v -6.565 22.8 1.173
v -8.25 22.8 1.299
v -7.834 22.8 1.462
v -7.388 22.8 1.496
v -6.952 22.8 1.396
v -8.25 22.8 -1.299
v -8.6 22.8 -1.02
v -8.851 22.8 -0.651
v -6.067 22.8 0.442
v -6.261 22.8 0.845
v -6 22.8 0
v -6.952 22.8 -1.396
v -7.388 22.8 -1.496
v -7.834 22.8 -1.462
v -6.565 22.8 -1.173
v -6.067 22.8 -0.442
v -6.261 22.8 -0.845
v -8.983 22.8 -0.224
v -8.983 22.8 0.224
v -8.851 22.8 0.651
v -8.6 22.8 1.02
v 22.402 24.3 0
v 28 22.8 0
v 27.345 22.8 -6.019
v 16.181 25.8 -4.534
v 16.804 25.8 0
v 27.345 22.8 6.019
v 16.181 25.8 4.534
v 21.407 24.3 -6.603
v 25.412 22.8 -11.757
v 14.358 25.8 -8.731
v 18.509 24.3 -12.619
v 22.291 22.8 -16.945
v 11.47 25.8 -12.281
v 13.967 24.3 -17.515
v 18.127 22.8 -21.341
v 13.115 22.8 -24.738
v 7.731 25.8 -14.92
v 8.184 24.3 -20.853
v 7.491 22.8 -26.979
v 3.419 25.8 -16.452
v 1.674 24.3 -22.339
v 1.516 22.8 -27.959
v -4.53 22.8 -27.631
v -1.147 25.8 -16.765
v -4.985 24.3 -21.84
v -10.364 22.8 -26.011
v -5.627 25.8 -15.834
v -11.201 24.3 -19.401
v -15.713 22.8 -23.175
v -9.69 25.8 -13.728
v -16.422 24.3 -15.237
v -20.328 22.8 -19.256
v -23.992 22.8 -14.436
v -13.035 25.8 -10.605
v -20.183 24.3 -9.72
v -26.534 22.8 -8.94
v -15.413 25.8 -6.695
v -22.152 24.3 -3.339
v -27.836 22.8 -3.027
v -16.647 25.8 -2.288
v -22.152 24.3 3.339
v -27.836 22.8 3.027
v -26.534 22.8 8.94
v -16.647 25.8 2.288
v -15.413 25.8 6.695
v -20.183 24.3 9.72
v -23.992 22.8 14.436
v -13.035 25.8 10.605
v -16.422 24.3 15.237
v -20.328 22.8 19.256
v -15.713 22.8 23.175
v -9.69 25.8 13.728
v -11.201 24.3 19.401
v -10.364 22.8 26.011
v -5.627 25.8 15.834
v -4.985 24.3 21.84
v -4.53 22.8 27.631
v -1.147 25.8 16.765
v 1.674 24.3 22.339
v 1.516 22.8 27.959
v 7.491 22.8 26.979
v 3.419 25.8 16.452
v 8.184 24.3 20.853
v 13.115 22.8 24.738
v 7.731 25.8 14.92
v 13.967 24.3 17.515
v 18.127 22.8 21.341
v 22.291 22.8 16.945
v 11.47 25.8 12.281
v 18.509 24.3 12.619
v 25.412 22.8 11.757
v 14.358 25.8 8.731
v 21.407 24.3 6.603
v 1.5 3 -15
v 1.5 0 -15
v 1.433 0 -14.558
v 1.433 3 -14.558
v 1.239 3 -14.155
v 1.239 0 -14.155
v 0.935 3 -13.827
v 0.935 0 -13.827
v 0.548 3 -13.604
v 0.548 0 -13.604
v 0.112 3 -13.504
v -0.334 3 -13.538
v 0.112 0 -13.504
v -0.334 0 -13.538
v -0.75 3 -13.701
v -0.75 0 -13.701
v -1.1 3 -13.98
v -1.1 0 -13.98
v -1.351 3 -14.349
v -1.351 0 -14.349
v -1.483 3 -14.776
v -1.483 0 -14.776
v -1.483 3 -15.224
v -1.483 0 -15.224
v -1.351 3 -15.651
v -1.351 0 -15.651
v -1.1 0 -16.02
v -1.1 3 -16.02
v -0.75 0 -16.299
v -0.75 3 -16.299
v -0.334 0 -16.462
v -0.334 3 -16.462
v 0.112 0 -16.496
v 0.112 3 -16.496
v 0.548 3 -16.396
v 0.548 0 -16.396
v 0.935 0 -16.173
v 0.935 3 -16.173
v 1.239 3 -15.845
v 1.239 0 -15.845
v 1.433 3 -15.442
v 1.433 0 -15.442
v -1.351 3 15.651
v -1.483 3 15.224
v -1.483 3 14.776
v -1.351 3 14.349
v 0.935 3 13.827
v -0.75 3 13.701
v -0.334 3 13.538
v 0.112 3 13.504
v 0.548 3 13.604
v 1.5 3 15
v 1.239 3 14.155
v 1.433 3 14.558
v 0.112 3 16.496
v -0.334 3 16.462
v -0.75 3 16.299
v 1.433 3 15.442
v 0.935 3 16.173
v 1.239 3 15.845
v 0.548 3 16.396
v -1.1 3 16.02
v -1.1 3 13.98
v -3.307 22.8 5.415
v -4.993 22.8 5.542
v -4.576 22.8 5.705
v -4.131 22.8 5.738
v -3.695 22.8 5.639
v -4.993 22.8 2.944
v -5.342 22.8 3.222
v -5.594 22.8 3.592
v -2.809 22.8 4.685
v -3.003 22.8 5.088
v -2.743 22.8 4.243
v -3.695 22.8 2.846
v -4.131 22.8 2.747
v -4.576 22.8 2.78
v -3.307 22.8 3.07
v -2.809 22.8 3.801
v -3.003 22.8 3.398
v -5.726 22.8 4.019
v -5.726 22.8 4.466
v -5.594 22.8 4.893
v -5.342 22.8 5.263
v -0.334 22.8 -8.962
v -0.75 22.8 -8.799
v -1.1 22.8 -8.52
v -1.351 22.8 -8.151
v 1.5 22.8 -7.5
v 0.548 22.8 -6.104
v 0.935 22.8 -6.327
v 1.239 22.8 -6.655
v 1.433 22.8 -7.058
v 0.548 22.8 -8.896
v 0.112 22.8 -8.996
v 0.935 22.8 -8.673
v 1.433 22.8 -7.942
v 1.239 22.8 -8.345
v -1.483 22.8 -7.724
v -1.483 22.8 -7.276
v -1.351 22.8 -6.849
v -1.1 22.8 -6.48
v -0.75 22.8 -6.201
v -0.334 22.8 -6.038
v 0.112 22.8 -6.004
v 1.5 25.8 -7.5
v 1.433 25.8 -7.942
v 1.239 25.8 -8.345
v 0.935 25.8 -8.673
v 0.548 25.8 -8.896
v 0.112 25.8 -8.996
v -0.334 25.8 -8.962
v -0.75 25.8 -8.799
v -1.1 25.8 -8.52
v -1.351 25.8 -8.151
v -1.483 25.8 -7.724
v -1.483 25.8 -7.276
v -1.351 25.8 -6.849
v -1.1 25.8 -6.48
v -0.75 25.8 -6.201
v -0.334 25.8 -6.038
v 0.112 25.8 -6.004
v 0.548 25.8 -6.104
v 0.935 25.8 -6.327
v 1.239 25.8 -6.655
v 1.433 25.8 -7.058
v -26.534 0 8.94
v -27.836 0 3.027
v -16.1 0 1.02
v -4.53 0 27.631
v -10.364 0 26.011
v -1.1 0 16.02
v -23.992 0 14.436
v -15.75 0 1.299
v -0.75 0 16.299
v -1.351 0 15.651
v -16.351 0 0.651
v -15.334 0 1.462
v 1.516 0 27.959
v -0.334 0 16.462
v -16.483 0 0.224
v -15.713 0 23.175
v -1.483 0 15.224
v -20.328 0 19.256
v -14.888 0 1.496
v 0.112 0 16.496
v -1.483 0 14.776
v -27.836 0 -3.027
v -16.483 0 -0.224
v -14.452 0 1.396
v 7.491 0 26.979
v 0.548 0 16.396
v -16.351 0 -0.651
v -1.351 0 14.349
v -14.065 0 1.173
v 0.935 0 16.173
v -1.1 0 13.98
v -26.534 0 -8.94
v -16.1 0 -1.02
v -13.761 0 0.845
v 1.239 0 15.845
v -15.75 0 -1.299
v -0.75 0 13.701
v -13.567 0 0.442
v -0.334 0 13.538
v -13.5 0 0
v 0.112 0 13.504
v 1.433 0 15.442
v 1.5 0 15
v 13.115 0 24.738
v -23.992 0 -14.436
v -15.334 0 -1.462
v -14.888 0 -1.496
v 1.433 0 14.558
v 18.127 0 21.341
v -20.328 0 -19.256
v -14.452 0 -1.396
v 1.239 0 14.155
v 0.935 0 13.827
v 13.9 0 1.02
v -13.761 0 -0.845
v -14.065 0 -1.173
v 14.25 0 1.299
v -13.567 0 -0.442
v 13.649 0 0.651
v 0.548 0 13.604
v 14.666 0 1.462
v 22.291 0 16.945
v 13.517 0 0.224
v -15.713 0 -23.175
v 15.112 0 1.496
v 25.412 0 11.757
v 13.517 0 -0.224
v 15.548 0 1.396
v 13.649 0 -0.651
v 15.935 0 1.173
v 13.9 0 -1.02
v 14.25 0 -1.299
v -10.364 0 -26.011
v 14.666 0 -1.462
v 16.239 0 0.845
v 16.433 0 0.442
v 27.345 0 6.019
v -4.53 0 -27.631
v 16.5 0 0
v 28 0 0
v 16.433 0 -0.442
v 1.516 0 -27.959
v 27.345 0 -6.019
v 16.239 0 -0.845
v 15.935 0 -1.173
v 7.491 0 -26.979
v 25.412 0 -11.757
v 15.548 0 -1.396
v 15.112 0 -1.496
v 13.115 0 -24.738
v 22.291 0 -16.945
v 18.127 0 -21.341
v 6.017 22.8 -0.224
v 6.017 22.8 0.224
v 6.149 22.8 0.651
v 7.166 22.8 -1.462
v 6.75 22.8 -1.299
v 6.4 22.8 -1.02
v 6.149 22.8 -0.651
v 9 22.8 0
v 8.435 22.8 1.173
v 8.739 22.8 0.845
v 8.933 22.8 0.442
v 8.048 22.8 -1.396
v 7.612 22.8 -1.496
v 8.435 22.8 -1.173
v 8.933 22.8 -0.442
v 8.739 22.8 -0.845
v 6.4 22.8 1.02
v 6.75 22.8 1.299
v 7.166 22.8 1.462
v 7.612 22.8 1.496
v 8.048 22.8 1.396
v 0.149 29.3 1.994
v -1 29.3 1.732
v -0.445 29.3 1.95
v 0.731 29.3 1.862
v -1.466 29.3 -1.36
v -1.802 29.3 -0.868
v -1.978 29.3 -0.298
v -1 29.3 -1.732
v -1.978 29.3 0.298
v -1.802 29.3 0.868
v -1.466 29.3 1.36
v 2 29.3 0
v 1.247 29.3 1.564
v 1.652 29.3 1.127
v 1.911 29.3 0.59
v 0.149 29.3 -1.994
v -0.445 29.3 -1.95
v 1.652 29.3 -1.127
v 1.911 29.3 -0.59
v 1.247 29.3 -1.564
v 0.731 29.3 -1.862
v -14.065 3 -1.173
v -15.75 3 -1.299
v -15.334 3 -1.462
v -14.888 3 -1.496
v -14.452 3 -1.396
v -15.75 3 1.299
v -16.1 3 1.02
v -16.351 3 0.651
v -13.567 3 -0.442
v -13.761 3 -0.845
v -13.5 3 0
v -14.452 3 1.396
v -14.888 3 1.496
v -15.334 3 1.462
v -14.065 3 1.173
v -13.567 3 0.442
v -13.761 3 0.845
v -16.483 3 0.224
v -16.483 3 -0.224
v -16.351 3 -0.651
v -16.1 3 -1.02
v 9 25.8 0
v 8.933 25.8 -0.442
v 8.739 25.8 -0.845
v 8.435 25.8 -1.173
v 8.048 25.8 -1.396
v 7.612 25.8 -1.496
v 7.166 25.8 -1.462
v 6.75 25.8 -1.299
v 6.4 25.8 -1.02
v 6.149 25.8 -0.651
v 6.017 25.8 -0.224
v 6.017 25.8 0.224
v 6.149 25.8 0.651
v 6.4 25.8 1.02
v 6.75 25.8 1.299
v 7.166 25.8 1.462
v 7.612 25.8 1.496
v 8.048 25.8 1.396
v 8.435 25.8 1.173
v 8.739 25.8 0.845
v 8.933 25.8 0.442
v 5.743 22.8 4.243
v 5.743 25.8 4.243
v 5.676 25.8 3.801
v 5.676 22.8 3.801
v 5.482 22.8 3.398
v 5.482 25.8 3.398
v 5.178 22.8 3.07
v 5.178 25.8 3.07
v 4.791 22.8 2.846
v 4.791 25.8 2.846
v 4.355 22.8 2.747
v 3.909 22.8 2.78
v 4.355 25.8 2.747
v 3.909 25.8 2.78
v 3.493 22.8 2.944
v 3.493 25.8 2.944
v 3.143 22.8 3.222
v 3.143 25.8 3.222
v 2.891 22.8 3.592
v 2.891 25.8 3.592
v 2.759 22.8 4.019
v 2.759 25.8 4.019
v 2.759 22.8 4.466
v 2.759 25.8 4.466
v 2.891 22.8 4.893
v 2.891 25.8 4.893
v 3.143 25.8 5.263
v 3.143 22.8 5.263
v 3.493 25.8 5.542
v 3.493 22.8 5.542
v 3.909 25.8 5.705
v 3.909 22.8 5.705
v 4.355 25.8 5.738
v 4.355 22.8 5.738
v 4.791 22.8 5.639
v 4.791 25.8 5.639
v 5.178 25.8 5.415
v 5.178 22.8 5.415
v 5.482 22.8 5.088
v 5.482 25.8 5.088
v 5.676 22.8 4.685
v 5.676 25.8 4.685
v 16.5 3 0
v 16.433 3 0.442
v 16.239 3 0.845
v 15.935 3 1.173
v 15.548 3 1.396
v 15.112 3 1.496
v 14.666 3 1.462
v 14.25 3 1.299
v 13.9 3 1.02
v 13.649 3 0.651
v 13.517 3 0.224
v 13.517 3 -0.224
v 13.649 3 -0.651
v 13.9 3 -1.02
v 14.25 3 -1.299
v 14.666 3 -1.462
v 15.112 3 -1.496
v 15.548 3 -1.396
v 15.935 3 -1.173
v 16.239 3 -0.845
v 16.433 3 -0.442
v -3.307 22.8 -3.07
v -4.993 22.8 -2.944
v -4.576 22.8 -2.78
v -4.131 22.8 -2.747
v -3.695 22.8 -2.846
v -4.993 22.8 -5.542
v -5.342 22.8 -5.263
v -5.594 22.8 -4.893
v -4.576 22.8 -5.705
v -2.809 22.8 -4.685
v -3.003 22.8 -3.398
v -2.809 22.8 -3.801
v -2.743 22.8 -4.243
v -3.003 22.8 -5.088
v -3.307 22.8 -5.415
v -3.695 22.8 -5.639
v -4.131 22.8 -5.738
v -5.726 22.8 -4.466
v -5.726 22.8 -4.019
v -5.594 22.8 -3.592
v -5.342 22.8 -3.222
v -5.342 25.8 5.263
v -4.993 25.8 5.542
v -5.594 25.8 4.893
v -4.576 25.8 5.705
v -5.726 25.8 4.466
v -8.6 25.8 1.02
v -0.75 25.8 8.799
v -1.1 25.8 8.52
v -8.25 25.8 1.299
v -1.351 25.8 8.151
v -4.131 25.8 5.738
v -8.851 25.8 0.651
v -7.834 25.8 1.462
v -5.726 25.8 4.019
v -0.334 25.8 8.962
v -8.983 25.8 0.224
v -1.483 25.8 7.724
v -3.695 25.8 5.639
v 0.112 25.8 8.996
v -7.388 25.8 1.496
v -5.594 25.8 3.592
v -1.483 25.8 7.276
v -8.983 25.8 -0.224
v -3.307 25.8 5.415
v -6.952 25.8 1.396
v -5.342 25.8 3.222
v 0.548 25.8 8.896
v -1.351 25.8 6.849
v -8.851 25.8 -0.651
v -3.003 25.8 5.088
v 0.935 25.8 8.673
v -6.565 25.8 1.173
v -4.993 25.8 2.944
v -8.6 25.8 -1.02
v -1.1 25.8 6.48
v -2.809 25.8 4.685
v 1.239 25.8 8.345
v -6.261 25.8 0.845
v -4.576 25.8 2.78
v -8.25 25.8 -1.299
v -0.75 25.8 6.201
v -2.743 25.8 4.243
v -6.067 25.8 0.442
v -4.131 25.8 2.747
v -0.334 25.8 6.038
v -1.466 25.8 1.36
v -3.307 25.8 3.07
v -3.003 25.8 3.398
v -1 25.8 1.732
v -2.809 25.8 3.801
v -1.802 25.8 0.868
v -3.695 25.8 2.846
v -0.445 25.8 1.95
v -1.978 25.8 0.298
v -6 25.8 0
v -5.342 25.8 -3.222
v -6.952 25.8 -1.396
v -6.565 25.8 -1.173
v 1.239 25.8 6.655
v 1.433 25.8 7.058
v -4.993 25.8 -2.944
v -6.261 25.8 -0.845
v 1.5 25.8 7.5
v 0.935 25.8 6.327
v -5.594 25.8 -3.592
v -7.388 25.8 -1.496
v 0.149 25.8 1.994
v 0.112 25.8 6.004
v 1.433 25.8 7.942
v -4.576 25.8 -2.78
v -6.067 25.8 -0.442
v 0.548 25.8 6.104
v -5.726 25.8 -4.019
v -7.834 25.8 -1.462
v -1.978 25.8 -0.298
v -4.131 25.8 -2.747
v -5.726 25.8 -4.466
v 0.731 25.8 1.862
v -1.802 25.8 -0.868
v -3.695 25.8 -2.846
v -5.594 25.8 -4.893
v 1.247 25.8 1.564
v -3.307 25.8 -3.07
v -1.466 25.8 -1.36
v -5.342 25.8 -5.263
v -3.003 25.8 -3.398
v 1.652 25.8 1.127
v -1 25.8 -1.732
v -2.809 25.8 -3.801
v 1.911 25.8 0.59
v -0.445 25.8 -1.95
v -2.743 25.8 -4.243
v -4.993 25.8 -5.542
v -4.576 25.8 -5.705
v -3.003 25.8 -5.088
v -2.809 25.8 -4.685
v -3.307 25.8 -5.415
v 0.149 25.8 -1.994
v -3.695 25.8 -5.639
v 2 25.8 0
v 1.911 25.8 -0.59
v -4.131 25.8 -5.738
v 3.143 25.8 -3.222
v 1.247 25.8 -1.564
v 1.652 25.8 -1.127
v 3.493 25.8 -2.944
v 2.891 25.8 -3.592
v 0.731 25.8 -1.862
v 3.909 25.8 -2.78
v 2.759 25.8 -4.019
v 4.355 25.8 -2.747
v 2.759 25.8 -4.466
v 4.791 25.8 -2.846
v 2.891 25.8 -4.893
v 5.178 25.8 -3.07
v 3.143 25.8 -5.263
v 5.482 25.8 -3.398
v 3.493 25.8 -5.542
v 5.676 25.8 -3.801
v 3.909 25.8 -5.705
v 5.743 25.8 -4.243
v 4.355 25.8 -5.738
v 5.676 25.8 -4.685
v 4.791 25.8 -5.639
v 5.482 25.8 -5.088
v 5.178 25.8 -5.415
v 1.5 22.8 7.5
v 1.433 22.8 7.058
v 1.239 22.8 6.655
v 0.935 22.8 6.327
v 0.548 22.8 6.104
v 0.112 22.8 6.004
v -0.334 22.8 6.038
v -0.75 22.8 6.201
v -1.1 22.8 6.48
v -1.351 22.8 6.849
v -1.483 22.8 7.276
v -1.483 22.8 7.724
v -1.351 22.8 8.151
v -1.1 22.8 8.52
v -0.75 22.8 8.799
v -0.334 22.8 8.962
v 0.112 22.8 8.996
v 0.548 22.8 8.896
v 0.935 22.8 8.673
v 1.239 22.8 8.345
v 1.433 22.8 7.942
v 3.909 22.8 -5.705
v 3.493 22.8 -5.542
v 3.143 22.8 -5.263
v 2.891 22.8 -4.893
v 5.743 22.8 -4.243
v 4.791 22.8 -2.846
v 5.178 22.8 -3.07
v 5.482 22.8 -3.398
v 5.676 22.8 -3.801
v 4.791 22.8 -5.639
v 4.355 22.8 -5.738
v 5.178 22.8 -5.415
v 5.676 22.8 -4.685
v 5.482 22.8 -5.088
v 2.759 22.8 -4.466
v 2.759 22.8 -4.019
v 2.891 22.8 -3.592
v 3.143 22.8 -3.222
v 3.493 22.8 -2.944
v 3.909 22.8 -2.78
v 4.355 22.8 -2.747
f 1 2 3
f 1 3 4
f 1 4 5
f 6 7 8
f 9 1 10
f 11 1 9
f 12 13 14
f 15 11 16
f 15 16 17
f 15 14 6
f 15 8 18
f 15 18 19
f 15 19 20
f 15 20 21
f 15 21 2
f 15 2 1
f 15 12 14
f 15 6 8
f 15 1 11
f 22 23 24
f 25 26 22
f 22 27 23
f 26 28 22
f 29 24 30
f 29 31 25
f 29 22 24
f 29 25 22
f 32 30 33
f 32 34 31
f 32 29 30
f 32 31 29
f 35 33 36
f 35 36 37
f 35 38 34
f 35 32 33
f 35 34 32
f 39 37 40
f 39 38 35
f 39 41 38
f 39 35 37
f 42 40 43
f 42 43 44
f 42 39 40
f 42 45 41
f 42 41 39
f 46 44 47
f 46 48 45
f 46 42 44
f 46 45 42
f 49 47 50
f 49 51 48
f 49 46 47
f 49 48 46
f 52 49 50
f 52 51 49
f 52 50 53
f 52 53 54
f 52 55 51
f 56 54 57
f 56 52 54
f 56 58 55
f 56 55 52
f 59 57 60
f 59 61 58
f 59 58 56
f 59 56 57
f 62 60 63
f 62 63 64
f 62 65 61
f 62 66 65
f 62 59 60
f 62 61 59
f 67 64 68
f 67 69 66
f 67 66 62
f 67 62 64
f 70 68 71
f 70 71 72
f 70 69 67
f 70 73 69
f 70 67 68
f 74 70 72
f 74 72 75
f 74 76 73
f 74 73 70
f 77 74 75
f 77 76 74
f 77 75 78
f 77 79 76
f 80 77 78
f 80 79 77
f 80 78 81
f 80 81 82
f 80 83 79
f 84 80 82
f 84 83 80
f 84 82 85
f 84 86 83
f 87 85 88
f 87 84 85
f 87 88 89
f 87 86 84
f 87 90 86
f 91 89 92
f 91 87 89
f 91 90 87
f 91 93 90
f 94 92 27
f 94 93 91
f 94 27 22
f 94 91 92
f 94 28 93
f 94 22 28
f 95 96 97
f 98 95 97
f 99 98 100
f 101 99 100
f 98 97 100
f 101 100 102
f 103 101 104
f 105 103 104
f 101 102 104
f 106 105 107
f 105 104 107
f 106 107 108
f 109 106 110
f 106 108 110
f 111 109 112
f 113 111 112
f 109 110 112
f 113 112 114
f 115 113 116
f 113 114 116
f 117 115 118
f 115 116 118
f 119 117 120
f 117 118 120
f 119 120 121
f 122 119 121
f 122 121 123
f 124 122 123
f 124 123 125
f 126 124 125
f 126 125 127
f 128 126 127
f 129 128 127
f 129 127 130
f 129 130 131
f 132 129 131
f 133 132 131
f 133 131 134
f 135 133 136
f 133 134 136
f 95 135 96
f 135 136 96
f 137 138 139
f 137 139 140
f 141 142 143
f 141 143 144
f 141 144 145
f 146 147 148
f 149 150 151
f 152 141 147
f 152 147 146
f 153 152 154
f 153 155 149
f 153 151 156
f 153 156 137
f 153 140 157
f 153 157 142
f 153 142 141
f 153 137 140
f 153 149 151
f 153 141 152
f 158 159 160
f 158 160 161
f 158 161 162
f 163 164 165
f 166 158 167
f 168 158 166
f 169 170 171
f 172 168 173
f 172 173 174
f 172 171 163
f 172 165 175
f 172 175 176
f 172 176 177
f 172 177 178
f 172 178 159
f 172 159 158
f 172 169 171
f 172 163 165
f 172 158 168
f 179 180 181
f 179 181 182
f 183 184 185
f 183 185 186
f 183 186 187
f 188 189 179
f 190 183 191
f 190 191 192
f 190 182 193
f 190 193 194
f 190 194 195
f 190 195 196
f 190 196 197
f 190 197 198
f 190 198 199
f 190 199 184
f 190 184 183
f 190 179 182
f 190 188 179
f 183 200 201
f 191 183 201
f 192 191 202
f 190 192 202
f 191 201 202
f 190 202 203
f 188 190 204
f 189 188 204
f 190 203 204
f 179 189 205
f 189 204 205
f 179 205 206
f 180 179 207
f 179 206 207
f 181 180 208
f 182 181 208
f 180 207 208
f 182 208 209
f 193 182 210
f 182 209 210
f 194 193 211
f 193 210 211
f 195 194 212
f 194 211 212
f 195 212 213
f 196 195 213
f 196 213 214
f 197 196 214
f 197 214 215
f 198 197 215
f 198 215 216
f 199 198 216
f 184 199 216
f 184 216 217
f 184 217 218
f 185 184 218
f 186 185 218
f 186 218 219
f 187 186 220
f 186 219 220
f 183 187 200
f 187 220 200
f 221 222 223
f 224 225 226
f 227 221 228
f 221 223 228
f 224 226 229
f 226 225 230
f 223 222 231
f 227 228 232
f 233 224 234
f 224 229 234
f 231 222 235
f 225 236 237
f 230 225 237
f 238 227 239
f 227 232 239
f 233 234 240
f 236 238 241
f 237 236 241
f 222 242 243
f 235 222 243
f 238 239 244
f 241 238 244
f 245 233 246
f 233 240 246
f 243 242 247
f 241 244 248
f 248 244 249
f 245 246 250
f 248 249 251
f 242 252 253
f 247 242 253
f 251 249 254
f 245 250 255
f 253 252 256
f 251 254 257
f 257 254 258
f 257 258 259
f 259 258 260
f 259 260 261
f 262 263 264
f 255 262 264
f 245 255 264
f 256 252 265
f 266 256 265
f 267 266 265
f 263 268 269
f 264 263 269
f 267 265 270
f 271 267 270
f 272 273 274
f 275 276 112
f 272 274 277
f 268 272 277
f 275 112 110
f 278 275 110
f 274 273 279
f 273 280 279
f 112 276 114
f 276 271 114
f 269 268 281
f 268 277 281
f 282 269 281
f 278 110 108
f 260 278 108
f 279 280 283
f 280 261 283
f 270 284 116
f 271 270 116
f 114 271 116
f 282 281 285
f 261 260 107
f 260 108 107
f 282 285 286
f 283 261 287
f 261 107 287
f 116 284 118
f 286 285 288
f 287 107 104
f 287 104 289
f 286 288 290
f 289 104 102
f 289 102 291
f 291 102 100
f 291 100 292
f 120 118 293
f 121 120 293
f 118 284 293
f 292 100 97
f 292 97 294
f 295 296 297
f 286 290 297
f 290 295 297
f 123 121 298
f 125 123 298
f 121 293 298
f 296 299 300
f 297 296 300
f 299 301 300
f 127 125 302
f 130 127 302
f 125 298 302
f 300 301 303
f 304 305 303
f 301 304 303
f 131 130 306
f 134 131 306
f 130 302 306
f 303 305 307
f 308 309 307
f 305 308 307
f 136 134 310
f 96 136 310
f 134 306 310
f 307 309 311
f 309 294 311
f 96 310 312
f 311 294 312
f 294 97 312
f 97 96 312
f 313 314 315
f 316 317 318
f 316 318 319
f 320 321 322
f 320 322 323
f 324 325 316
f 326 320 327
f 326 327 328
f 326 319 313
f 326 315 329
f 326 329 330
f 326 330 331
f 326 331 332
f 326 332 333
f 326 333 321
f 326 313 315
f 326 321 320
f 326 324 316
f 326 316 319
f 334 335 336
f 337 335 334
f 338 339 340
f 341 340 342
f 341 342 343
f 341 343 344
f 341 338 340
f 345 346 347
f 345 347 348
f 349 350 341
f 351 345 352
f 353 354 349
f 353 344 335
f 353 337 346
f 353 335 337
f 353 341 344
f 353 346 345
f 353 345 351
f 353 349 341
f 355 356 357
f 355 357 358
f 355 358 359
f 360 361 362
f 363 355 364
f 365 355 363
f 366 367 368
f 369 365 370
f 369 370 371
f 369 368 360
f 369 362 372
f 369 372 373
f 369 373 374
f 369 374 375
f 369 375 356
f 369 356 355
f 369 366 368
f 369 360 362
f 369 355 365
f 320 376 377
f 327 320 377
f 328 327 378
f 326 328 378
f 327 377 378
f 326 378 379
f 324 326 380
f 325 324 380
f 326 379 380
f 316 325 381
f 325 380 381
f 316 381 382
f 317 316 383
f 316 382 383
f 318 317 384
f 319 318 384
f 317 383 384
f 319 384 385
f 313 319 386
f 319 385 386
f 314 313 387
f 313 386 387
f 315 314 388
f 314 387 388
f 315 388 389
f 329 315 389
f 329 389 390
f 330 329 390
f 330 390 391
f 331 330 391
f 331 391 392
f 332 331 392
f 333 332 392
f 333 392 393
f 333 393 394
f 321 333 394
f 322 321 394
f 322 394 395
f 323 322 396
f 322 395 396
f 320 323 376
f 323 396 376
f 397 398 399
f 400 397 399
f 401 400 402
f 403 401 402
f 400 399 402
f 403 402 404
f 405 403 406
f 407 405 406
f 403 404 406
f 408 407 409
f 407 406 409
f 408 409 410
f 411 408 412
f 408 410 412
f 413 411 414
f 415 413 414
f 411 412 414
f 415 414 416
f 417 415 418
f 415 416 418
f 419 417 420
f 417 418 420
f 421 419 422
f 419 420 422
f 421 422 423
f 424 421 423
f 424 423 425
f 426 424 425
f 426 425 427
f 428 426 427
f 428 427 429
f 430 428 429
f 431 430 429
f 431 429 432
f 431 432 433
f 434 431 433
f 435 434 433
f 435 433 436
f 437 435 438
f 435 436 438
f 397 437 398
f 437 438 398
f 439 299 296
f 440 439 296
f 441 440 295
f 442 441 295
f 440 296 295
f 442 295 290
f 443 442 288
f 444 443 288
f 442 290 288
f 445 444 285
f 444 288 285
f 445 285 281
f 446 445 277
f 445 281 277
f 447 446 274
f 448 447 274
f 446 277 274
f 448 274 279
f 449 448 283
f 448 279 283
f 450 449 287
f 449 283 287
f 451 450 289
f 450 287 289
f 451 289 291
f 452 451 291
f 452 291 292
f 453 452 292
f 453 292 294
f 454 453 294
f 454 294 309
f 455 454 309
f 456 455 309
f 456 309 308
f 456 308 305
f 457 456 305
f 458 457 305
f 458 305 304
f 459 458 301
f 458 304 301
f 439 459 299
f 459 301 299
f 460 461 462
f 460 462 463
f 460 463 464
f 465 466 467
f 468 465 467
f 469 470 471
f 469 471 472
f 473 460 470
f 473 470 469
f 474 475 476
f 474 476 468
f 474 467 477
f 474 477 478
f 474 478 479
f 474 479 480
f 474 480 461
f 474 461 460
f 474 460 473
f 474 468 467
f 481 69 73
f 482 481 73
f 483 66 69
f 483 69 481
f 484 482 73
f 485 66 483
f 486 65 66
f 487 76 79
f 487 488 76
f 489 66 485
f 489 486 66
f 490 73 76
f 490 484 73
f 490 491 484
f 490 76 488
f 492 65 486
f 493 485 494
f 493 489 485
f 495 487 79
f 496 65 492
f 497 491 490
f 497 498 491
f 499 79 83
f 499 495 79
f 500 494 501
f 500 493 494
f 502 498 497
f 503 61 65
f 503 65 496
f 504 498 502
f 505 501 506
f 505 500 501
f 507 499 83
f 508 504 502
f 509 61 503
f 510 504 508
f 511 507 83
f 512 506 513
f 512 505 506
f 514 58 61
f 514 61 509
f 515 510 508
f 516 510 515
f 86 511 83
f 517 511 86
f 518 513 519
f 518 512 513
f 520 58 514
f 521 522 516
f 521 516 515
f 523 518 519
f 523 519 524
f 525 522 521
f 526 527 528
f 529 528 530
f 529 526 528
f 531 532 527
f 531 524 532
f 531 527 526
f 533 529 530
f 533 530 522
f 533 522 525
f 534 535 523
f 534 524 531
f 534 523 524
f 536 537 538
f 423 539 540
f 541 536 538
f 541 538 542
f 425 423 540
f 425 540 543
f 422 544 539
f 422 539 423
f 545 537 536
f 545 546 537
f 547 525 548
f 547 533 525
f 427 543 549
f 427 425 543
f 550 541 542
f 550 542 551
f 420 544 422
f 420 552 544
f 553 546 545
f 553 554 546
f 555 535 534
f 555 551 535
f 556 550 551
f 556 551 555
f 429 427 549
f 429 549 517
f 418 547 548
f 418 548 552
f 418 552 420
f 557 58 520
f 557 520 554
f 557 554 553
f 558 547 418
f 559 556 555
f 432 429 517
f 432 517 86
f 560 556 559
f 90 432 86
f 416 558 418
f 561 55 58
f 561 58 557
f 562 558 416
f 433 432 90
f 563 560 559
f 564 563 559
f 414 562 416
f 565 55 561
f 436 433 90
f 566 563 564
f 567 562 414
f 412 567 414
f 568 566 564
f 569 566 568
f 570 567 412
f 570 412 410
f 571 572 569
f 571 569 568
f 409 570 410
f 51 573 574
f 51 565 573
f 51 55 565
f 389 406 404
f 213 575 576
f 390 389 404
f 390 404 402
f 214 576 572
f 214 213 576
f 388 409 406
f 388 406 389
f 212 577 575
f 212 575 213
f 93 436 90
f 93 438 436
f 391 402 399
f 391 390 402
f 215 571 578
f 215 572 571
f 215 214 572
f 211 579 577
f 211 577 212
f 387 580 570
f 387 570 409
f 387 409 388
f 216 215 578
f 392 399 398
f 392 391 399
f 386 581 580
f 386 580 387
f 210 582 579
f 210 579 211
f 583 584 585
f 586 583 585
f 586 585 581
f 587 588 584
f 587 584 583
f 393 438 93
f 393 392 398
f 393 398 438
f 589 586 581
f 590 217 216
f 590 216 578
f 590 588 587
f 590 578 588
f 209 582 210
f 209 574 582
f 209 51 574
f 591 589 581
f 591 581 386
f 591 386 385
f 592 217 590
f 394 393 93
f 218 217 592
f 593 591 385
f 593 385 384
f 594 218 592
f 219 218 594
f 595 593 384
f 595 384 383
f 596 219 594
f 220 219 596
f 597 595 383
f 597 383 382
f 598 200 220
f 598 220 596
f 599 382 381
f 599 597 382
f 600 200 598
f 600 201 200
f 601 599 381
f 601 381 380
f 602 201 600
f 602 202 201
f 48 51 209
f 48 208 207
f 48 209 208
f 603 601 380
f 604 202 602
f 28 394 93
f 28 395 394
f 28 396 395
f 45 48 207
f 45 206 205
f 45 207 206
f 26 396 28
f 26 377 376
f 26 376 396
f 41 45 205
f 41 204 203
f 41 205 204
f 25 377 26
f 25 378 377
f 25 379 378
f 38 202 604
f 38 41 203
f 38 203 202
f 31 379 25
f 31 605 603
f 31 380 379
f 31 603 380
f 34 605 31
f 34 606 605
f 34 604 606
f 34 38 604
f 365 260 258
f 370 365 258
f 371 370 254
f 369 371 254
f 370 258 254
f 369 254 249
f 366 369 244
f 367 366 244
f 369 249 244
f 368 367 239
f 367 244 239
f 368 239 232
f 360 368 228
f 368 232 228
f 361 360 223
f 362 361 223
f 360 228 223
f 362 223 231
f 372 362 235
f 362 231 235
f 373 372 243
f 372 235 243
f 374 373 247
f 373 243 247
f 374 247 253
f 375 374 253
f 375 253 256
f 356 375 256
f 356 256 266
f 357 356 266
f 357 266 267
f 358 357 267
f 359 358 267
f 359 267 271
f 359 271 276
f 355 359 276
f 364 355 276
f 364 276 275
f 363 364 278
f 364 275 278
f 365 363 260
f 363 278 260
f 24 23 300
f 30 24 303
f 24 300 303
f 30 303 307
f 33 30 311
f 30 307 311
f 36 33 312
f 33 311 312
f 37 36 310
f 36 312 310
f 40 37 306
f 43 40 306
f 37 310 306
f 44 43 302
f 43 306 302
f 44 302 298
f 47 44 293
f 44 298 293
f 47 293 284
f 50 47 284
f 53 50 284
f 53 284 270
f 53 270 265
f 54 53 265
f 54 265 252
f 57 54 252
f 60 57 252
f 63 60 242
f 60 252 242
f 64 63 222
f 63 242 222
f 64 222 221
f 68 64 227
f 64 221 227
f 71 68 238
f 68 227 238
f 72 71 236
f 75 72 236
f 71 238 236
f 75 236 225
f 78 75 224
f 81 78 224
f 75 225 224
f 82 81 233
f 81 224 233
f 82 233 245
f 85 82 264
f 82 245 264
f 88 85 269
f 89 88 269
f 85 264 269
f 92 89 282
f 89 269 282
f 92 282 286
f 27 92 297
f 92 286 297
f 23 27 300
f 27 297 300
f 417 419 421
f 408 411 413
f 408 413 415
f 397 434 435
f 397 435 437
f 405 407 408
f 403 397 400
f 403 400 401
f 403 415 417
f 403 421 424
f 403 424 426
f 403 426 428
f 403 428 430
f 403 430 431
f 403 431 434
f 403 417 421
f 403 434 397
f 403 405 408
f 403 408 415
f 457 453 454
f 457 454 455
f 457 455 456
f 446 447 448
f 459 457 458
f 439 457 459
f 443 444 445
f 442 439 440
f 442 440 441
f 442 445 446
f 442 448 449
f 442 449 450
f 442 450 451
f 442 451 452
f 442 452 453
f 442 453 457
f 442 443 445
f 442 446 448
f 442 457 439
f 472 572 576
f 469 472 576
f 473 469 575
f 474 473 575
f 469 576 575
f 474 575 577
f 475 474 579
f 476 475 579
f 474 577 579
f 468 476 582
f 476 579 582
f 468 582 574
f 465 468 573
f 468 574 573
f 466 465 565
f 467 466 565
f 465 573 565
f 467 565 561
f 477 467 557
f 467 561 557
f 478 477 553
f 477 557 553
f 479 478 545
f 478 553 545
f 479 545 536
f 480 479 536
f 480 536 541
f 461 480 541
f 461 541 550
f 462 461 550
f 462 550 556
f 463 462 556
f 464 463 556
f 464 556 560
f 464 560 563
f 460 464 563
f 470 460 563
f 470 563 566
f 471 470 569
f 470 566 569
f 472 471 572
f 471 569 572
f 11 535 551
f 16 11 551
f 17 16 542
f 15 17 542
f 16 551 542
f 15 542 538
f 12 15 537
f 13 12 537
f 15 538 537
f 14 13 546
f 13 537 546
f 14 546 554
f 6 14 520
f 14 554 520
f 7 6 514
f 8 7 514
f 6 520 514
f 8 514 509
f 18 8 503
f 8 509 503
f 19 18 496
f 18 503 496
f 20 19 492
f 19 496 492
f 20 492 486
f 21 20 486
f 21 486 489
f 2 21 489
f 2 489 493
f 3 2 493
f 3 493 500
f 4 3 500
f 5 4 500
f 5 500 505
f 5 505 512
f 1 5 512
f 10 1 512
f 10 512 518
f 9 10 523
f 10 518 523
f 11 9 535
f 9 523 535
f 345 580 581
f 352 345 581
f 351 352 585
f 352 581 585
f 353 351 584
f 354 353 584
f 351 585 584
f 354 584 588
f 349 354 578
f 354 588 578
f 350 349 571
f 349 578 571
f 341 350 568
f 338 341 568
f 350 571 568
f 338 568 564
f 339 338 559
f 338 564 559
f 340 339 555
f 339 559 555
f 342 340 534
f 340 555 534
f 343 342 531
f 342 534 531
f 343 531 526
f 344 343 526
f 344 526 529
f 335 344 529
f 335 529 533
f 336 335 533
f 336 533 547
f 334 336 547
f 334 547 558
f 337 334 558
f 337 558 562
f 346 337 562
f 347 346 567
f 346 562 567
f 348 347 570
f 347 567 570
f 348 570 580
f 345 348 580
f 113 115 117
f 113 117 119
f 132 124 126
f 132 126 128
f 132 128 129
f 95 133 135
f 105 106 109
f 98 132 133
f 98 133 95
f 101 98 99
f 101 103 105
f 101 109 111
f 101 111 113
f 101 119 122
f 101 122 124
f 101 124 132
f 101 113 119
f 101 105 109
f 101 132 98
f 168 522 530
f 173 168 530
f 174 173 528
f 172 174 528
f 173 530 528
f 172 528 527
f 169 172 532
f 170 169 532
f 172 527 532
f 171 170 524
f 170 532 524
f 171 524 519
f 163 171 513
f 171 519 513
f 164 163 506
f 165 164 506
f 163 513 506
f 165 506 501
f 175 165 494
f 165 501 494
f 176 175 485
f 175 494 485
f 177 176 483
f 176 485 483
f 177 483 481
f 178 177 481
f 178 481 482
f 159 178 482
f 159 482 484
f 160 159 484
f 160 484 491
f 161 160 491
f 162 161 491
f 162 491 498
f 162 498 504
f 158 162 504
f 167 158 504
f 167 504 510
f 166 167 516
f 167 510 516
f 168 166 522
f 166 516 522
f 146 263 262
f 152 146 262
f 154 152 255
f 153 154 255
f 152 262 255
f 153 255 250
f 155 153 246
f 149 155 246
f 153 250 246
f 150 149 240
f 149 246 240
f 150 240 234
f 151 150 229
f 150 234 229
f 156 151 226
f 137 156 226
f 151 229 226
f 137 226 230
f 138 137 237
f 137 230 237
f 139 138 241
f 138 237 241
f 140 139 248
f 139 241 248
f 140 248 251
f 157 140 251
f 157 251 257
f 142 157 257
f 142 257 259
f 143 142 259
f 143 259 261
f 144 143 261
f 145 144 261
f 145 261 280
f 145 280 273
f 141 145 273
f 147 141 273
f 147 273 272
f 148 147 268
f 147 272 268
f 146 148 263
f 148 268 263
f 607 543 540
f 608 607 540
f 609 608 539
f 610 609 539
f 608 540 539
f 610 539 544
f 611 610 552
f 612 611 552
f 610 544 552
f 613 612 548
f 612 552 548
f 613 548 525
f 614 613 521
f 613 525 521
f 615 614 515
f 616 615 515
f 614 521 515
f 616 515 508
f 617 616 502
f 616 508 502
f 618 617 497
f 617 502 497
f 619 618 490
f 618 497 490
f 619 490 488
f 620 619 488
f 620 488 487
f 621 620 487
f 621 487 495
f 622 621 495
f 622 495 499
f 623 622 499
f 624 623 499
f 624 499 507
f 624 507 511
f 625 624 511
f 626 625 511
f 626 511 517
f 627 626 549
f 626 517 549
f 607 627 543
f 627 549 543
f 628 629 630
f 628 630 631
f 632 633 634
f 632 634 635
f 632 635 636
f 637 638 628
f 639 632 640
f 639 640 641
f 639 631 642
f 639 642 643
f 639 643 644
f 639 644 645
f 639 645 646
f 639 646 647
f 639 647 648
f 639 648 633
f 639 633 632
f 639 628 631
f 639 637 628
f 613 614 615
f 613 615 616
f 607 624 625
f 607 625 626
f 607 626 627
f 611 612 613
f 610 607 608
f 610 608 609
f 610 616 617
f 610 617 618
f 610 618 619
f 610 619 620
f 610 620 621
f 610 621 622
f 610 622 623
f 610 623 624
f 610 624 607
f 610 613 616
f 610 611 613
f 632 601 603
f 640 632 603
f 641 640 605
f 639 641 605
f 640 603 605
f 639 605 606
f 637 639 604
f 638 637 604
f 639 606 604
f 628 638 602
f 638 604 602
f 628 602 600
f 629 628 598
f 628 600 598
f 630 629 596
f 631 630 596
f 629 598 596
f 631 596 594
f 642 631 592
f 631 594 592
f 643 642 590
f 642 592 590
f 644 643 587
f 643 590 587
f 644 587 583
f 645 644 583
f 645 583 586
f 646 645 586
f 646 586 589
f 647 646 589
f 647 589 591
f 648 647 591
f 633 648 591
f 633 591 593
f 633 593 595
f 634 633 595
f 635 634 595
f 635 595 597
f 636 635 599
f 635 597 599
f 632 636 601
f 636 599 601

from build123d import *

# Parameters (mm, degrees)
SKETCH1_R           = 28
BOSS_EXTRUDE1_DEPTH = 25.8
SKETCH2_R           = 2
BOSS_EXTRUDE2_DEPTH = 3.5
SKETCH3_R           = 1.5
CUT_EXTRUDE1_DEPTH  = 3
SKETCH4_R           = 1.5
CUT_EXTRUDE2_DEPTH  = 3
CHAMFER1_SIZE       = 3
CHAMFER1_SIZE2      = 11.196152423


with BuildPart() as part:
    # Sketch1 → Boss-Extrude1 (new body)
    with BuildSketch(Plane(origin=(0, 0, 0), x_dir=(1, 0, 0), z_dir=(0, 1, 0))):
        Circle(SKETCH1_R)
    extrude(amount=BOSS_EXTRUDE1_DEPTH)

    # Sketch2 → Boss-Extrude2 (add)
    with BuildSketch(Plane(origin=(0, 25.8, 0), x_dir=(1, 0, 0), z_dir=(0, 1, 0))):
        Circle(SKETCH2_R)
    extrude(amount=BOSS_EXTRUDE2_DEPTH)

    # Sketch3 → Cut-Extrude1 (cut)
    with BuildSketch(Plane.XZ):
        with Locations((0, 15)):
            Circle(SKETCH3_R)
        with Locations((15, 0)):
            Circle(SKETCH3_R)
        with Locations((0, -15)):
            Circle(SKETCH3_R)
        with Locations((-15, 0)):
            Circle(SKETCH3_R)
    extrude(amount=-CUT_EXTRUDE1_DEPTH, mode=Mode.SUBTRACT)

    # Sketch4 → Cut-Extrude2 (cut)
    with BuildSketch(Plane(origin=(0, 25.8, 0), x_dir=(1, 0, 0), z_dir=(0, 1, 0))):
        with Locations((0, 7.5)):
            Circle(SKETCH4_R)
        with Locations((7.5, 0)):
            Circle(SKETCH4_R)
        with Locations((0, -7.5)):
            Circle(SKETCH4_R)
        with Locations((-7.5, 0)):
            Circle(SKETCH4_R)
        with Locations((4.242640687, 4.242640687)):
            Circle(SKETCH4_R)
        with Locations((4.242640687, -4.242640687)):
            Circle(SKETCH4_R)
        with Locations((-4.242640687, -4.242640687)):
            Circle(SKETCH4_R)
        with Locations((-4.242640687, 4.242640687)):
            Circle(SKETCH4_R)
    extrude(amount=-CUT_EXTRUDE2_DEPTH, mode=Mode.SUBTRACT)

    # Chamfer1
    chamfer1_edges = [part.edges().sort_by_distance(p)[0] for p in [
        (-28, 25.8, 0),
    ]]
    chamfer1_side = [part.faces().sort_by_distance(p)[0] for p in [
        (-28, 12.9, 0),
    ]]
    chamfer(chamfer1_edges, length=CHAMFER1_SIZE, length2=CHAMFER1_SIZE2, reference=chamfer1_side[0])


solid = part.part
